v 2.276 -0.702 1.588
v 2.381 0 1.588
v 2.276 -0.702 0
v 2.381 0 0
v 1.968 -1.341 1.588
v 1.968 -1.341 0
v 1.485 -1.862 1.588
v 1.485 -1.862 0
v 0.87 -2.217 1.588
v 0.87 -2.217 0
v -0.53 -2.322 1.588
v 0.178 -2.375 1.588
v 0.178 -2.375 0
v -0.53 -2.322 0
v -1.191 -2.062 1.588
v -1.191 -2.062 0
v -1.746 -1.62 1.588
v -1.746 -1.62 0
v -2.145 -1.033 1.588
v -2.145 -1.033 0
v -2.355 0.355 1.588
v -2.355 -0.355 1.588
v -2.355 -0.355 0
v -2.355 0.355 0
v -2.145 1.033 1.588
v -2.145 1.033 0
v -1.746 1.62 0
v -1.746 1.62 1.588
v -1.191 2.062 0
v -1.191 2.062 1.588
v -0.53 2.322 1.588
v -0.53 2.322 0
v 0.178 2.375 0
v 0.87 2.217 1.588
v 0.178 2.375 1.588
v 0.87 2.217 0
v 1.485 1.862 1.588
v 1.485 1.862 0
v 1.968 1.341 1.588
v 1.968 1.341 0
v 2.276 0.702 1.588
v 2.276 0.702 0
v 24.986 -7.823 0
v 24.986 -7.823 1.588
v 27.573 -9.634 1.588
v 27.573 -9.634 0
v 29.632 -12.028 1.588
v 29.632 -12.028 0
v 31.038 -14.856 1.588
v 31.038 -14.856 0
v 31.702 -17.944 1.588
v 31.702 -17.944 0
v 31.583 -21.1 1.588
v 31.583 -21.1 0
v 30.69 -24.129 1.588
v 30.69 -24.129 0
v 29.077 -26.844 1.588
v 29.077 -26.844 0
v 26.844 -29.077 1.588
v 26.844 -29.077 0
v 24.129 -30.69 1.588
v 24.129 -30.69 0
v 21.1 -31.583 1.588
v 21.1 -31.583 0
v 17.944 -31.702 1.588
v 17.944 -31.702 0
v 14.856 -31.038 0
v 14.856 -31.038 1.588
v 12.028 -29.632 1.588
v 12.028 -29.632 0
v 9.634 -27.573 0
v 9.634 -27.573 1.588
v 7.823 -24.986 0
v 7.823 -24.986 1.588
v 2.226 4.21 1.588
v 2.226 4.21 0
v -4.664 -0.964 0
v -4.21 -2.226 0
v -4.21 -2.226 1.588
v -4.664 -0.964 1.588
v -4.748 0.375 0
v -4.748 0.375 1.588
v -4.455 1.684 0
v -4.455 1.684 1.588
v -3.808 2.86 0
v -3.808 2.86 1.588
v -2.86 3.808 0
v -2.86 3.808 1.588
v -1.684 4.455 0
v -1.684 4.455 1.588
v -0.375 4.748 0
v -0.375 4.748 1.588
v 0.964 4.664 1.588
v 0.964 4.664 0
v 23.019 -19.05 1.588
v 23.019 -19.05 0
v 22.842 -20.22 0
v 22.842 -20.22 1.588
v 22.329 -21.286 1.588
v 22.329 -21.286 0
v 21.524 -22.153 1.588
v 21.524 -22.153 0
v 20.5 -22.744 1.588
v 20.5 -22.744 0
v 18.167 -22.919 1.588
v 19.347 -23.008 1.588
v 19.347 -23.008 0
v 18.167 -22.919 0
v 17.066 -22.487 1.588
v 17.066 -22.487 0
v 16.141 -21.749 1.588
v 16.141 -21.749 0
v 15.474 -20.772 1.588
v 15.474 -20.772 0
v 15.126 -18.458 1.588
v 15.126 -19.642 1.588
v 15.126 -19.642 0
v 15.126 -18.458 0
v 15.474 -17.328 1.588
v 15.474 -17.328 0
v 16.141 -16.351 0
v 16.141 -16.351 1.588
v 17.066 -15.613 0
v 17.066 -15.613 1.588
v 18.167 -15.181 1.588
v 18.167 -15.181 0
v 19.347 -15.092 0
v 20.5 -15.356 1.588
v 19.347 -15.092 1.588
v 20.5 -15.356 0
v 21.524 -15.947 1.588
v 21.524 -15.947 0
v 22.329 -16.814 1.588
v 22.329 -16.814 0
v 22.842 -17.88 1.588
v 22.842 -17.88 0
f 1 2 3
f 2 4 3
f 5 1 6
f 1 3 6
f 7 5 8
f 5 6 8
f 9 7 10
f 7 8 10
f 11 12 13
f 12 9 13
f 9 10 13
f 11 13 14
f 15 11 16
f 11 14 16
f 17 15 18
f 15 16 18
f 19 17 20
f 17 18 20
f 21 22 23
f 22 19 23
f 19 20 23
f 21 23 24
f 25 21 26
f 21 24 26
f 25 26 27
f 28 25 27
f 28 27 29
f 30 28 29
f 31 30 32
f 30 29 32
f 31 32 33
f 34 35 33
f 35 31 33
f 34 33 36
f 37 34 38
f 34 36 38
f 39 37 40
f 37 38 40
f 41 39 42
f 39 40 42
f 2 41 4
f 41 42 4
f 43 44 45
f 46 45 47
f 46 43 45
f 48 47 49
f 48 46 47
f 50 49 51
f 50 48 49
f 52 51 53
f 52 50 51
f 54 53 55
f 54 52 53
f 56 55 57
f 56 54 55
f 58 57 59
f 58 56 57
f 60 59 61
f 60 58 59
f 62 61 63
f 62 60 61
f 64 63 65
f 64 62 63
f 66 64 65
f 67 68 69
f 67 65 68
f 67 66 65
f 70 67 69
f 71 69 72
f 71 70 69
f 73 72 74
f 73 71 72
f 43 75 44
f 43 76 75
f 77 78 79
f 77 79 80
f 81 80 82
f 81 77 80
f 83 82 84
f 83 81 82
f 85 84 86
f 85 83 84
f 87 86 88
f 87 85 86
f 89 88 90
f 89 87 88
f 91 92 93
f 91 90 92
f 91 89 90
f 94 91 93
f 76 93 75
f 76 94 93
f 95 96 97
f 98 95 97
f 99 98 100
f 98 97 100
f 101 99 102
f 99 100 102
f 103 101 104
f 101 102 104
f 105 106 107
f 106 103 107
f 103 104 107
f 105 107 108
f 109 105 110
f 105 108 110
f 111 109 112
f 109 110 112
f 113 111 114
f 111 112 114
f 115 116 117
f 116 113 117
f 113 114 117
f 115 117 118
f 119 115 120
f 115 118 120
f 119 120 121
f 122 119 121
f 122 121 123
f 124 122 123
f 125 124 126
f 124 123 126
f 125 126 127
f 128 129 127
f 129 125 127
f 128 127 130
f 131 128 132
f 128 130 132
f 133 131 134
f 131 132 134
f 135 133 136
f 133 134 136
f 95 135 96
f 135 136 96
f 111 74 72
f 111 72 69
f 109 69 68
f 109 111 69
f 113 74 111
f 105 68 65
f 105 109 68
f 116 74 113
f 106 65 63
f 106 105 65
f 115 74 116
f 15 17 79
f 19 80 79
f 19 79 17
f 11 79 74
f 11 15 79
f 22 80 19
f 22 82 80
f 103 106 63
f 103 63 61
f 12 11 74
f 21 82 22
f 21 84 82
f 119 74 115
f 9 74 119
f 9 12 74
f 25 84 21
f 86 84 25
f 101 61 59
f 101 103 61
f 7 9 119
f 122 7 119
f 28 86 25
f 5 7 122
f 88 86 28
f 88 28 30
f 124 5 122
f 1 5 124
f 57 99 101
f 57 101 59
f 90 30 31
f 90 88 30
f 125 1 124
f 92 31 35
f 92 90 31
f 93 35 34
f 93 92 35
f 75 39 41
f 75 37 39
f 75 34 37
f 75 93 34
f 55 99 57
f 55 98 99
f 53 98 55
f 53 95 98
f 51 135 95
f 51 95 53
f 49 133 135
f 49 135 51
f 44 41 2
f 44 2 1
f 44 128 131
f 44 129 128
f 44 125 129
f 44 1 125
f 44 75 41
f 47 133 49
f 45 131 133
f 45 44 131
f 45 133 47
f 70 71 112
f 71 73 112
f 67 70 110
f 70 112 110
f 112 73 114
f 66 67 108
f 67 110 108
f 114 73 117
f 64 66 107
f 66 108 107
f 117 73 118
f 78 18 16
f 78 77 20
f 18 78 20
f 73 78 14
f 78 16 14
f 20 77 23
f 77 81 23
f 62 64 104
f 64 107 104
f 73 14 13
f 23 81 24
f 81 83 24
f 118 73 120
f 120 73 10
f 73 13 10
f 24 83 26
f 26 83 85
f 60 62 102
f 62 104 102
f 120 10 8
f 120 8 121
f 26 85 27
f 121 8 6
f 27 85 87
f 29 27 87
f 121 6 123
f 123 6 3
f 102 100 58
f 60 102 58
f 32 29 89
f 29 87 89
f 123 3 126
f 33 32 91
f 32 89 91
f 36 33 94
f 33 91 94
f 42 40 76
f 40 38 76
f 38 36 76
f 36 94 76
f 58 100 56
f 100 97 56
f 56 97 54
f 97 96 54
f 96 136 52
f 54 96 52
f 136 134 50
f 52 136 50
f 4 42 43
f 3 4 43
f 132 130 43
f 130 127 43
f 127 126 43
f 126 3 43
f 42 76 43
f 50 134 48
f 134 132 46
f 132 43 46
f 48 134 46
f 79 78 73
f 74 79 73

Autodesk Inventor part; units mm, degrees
ref_plane "YZ Plane" through (0, 0, 0) normal (1, 0, 0) x (0, 1, 0)
ref_plane "XZ Plane" through (0, 0, 0) normal (0, 1, 0) x (-1, 0, 0)
ref_plane "XY Plane" through (0, 0, 0) normal (0, 0, 1) x (1, 0, 0)
sketch "Sketch1" plane through (0, 0, 0) normal (0, 0, 1) x (1, 0, 0)
  line L0 (0, 0) -> (0, -19.05) construction
  line L1 (0, -19.05) -> (19.05, -19.05) construction
  circle A0 centre (0, 0) radius 2.3813
  circle A1 centre (19.05, -19.05) radius 3.9687
  circle A2 centre (0, 0) radius 4.7625
  circle A3 centre (19.05, -19.05) radius 12.7
  line L2 (0, 0) -> (19.05, -19.05) construction
  line L3 (-4.3763, -1.912) -> (11.0982, -31.1817)
  line L4 (1.2997, 4.7) -> (30.5694, -10.7745)
  point P0 (7.7583, -1.6771)
  point P1 (-4.2103, -2.2259)
  point P2 (7.8225, -24.9858)
  point P3 (24.9858, -7.8225)
  point P4 (2.2259, 4.2103)
  dimension "d0" = 19.05
  dimension "d1" = 19.05
  dimension "d2" = 4.7625
  dimension "d3" = 7.9375
  dimension "d4" = 9.525
  dimension "d5" = 25.4
extrude "Extrusion1" add sketch "Sketch1" along normal blind 1.5875
properties part number "pto"
